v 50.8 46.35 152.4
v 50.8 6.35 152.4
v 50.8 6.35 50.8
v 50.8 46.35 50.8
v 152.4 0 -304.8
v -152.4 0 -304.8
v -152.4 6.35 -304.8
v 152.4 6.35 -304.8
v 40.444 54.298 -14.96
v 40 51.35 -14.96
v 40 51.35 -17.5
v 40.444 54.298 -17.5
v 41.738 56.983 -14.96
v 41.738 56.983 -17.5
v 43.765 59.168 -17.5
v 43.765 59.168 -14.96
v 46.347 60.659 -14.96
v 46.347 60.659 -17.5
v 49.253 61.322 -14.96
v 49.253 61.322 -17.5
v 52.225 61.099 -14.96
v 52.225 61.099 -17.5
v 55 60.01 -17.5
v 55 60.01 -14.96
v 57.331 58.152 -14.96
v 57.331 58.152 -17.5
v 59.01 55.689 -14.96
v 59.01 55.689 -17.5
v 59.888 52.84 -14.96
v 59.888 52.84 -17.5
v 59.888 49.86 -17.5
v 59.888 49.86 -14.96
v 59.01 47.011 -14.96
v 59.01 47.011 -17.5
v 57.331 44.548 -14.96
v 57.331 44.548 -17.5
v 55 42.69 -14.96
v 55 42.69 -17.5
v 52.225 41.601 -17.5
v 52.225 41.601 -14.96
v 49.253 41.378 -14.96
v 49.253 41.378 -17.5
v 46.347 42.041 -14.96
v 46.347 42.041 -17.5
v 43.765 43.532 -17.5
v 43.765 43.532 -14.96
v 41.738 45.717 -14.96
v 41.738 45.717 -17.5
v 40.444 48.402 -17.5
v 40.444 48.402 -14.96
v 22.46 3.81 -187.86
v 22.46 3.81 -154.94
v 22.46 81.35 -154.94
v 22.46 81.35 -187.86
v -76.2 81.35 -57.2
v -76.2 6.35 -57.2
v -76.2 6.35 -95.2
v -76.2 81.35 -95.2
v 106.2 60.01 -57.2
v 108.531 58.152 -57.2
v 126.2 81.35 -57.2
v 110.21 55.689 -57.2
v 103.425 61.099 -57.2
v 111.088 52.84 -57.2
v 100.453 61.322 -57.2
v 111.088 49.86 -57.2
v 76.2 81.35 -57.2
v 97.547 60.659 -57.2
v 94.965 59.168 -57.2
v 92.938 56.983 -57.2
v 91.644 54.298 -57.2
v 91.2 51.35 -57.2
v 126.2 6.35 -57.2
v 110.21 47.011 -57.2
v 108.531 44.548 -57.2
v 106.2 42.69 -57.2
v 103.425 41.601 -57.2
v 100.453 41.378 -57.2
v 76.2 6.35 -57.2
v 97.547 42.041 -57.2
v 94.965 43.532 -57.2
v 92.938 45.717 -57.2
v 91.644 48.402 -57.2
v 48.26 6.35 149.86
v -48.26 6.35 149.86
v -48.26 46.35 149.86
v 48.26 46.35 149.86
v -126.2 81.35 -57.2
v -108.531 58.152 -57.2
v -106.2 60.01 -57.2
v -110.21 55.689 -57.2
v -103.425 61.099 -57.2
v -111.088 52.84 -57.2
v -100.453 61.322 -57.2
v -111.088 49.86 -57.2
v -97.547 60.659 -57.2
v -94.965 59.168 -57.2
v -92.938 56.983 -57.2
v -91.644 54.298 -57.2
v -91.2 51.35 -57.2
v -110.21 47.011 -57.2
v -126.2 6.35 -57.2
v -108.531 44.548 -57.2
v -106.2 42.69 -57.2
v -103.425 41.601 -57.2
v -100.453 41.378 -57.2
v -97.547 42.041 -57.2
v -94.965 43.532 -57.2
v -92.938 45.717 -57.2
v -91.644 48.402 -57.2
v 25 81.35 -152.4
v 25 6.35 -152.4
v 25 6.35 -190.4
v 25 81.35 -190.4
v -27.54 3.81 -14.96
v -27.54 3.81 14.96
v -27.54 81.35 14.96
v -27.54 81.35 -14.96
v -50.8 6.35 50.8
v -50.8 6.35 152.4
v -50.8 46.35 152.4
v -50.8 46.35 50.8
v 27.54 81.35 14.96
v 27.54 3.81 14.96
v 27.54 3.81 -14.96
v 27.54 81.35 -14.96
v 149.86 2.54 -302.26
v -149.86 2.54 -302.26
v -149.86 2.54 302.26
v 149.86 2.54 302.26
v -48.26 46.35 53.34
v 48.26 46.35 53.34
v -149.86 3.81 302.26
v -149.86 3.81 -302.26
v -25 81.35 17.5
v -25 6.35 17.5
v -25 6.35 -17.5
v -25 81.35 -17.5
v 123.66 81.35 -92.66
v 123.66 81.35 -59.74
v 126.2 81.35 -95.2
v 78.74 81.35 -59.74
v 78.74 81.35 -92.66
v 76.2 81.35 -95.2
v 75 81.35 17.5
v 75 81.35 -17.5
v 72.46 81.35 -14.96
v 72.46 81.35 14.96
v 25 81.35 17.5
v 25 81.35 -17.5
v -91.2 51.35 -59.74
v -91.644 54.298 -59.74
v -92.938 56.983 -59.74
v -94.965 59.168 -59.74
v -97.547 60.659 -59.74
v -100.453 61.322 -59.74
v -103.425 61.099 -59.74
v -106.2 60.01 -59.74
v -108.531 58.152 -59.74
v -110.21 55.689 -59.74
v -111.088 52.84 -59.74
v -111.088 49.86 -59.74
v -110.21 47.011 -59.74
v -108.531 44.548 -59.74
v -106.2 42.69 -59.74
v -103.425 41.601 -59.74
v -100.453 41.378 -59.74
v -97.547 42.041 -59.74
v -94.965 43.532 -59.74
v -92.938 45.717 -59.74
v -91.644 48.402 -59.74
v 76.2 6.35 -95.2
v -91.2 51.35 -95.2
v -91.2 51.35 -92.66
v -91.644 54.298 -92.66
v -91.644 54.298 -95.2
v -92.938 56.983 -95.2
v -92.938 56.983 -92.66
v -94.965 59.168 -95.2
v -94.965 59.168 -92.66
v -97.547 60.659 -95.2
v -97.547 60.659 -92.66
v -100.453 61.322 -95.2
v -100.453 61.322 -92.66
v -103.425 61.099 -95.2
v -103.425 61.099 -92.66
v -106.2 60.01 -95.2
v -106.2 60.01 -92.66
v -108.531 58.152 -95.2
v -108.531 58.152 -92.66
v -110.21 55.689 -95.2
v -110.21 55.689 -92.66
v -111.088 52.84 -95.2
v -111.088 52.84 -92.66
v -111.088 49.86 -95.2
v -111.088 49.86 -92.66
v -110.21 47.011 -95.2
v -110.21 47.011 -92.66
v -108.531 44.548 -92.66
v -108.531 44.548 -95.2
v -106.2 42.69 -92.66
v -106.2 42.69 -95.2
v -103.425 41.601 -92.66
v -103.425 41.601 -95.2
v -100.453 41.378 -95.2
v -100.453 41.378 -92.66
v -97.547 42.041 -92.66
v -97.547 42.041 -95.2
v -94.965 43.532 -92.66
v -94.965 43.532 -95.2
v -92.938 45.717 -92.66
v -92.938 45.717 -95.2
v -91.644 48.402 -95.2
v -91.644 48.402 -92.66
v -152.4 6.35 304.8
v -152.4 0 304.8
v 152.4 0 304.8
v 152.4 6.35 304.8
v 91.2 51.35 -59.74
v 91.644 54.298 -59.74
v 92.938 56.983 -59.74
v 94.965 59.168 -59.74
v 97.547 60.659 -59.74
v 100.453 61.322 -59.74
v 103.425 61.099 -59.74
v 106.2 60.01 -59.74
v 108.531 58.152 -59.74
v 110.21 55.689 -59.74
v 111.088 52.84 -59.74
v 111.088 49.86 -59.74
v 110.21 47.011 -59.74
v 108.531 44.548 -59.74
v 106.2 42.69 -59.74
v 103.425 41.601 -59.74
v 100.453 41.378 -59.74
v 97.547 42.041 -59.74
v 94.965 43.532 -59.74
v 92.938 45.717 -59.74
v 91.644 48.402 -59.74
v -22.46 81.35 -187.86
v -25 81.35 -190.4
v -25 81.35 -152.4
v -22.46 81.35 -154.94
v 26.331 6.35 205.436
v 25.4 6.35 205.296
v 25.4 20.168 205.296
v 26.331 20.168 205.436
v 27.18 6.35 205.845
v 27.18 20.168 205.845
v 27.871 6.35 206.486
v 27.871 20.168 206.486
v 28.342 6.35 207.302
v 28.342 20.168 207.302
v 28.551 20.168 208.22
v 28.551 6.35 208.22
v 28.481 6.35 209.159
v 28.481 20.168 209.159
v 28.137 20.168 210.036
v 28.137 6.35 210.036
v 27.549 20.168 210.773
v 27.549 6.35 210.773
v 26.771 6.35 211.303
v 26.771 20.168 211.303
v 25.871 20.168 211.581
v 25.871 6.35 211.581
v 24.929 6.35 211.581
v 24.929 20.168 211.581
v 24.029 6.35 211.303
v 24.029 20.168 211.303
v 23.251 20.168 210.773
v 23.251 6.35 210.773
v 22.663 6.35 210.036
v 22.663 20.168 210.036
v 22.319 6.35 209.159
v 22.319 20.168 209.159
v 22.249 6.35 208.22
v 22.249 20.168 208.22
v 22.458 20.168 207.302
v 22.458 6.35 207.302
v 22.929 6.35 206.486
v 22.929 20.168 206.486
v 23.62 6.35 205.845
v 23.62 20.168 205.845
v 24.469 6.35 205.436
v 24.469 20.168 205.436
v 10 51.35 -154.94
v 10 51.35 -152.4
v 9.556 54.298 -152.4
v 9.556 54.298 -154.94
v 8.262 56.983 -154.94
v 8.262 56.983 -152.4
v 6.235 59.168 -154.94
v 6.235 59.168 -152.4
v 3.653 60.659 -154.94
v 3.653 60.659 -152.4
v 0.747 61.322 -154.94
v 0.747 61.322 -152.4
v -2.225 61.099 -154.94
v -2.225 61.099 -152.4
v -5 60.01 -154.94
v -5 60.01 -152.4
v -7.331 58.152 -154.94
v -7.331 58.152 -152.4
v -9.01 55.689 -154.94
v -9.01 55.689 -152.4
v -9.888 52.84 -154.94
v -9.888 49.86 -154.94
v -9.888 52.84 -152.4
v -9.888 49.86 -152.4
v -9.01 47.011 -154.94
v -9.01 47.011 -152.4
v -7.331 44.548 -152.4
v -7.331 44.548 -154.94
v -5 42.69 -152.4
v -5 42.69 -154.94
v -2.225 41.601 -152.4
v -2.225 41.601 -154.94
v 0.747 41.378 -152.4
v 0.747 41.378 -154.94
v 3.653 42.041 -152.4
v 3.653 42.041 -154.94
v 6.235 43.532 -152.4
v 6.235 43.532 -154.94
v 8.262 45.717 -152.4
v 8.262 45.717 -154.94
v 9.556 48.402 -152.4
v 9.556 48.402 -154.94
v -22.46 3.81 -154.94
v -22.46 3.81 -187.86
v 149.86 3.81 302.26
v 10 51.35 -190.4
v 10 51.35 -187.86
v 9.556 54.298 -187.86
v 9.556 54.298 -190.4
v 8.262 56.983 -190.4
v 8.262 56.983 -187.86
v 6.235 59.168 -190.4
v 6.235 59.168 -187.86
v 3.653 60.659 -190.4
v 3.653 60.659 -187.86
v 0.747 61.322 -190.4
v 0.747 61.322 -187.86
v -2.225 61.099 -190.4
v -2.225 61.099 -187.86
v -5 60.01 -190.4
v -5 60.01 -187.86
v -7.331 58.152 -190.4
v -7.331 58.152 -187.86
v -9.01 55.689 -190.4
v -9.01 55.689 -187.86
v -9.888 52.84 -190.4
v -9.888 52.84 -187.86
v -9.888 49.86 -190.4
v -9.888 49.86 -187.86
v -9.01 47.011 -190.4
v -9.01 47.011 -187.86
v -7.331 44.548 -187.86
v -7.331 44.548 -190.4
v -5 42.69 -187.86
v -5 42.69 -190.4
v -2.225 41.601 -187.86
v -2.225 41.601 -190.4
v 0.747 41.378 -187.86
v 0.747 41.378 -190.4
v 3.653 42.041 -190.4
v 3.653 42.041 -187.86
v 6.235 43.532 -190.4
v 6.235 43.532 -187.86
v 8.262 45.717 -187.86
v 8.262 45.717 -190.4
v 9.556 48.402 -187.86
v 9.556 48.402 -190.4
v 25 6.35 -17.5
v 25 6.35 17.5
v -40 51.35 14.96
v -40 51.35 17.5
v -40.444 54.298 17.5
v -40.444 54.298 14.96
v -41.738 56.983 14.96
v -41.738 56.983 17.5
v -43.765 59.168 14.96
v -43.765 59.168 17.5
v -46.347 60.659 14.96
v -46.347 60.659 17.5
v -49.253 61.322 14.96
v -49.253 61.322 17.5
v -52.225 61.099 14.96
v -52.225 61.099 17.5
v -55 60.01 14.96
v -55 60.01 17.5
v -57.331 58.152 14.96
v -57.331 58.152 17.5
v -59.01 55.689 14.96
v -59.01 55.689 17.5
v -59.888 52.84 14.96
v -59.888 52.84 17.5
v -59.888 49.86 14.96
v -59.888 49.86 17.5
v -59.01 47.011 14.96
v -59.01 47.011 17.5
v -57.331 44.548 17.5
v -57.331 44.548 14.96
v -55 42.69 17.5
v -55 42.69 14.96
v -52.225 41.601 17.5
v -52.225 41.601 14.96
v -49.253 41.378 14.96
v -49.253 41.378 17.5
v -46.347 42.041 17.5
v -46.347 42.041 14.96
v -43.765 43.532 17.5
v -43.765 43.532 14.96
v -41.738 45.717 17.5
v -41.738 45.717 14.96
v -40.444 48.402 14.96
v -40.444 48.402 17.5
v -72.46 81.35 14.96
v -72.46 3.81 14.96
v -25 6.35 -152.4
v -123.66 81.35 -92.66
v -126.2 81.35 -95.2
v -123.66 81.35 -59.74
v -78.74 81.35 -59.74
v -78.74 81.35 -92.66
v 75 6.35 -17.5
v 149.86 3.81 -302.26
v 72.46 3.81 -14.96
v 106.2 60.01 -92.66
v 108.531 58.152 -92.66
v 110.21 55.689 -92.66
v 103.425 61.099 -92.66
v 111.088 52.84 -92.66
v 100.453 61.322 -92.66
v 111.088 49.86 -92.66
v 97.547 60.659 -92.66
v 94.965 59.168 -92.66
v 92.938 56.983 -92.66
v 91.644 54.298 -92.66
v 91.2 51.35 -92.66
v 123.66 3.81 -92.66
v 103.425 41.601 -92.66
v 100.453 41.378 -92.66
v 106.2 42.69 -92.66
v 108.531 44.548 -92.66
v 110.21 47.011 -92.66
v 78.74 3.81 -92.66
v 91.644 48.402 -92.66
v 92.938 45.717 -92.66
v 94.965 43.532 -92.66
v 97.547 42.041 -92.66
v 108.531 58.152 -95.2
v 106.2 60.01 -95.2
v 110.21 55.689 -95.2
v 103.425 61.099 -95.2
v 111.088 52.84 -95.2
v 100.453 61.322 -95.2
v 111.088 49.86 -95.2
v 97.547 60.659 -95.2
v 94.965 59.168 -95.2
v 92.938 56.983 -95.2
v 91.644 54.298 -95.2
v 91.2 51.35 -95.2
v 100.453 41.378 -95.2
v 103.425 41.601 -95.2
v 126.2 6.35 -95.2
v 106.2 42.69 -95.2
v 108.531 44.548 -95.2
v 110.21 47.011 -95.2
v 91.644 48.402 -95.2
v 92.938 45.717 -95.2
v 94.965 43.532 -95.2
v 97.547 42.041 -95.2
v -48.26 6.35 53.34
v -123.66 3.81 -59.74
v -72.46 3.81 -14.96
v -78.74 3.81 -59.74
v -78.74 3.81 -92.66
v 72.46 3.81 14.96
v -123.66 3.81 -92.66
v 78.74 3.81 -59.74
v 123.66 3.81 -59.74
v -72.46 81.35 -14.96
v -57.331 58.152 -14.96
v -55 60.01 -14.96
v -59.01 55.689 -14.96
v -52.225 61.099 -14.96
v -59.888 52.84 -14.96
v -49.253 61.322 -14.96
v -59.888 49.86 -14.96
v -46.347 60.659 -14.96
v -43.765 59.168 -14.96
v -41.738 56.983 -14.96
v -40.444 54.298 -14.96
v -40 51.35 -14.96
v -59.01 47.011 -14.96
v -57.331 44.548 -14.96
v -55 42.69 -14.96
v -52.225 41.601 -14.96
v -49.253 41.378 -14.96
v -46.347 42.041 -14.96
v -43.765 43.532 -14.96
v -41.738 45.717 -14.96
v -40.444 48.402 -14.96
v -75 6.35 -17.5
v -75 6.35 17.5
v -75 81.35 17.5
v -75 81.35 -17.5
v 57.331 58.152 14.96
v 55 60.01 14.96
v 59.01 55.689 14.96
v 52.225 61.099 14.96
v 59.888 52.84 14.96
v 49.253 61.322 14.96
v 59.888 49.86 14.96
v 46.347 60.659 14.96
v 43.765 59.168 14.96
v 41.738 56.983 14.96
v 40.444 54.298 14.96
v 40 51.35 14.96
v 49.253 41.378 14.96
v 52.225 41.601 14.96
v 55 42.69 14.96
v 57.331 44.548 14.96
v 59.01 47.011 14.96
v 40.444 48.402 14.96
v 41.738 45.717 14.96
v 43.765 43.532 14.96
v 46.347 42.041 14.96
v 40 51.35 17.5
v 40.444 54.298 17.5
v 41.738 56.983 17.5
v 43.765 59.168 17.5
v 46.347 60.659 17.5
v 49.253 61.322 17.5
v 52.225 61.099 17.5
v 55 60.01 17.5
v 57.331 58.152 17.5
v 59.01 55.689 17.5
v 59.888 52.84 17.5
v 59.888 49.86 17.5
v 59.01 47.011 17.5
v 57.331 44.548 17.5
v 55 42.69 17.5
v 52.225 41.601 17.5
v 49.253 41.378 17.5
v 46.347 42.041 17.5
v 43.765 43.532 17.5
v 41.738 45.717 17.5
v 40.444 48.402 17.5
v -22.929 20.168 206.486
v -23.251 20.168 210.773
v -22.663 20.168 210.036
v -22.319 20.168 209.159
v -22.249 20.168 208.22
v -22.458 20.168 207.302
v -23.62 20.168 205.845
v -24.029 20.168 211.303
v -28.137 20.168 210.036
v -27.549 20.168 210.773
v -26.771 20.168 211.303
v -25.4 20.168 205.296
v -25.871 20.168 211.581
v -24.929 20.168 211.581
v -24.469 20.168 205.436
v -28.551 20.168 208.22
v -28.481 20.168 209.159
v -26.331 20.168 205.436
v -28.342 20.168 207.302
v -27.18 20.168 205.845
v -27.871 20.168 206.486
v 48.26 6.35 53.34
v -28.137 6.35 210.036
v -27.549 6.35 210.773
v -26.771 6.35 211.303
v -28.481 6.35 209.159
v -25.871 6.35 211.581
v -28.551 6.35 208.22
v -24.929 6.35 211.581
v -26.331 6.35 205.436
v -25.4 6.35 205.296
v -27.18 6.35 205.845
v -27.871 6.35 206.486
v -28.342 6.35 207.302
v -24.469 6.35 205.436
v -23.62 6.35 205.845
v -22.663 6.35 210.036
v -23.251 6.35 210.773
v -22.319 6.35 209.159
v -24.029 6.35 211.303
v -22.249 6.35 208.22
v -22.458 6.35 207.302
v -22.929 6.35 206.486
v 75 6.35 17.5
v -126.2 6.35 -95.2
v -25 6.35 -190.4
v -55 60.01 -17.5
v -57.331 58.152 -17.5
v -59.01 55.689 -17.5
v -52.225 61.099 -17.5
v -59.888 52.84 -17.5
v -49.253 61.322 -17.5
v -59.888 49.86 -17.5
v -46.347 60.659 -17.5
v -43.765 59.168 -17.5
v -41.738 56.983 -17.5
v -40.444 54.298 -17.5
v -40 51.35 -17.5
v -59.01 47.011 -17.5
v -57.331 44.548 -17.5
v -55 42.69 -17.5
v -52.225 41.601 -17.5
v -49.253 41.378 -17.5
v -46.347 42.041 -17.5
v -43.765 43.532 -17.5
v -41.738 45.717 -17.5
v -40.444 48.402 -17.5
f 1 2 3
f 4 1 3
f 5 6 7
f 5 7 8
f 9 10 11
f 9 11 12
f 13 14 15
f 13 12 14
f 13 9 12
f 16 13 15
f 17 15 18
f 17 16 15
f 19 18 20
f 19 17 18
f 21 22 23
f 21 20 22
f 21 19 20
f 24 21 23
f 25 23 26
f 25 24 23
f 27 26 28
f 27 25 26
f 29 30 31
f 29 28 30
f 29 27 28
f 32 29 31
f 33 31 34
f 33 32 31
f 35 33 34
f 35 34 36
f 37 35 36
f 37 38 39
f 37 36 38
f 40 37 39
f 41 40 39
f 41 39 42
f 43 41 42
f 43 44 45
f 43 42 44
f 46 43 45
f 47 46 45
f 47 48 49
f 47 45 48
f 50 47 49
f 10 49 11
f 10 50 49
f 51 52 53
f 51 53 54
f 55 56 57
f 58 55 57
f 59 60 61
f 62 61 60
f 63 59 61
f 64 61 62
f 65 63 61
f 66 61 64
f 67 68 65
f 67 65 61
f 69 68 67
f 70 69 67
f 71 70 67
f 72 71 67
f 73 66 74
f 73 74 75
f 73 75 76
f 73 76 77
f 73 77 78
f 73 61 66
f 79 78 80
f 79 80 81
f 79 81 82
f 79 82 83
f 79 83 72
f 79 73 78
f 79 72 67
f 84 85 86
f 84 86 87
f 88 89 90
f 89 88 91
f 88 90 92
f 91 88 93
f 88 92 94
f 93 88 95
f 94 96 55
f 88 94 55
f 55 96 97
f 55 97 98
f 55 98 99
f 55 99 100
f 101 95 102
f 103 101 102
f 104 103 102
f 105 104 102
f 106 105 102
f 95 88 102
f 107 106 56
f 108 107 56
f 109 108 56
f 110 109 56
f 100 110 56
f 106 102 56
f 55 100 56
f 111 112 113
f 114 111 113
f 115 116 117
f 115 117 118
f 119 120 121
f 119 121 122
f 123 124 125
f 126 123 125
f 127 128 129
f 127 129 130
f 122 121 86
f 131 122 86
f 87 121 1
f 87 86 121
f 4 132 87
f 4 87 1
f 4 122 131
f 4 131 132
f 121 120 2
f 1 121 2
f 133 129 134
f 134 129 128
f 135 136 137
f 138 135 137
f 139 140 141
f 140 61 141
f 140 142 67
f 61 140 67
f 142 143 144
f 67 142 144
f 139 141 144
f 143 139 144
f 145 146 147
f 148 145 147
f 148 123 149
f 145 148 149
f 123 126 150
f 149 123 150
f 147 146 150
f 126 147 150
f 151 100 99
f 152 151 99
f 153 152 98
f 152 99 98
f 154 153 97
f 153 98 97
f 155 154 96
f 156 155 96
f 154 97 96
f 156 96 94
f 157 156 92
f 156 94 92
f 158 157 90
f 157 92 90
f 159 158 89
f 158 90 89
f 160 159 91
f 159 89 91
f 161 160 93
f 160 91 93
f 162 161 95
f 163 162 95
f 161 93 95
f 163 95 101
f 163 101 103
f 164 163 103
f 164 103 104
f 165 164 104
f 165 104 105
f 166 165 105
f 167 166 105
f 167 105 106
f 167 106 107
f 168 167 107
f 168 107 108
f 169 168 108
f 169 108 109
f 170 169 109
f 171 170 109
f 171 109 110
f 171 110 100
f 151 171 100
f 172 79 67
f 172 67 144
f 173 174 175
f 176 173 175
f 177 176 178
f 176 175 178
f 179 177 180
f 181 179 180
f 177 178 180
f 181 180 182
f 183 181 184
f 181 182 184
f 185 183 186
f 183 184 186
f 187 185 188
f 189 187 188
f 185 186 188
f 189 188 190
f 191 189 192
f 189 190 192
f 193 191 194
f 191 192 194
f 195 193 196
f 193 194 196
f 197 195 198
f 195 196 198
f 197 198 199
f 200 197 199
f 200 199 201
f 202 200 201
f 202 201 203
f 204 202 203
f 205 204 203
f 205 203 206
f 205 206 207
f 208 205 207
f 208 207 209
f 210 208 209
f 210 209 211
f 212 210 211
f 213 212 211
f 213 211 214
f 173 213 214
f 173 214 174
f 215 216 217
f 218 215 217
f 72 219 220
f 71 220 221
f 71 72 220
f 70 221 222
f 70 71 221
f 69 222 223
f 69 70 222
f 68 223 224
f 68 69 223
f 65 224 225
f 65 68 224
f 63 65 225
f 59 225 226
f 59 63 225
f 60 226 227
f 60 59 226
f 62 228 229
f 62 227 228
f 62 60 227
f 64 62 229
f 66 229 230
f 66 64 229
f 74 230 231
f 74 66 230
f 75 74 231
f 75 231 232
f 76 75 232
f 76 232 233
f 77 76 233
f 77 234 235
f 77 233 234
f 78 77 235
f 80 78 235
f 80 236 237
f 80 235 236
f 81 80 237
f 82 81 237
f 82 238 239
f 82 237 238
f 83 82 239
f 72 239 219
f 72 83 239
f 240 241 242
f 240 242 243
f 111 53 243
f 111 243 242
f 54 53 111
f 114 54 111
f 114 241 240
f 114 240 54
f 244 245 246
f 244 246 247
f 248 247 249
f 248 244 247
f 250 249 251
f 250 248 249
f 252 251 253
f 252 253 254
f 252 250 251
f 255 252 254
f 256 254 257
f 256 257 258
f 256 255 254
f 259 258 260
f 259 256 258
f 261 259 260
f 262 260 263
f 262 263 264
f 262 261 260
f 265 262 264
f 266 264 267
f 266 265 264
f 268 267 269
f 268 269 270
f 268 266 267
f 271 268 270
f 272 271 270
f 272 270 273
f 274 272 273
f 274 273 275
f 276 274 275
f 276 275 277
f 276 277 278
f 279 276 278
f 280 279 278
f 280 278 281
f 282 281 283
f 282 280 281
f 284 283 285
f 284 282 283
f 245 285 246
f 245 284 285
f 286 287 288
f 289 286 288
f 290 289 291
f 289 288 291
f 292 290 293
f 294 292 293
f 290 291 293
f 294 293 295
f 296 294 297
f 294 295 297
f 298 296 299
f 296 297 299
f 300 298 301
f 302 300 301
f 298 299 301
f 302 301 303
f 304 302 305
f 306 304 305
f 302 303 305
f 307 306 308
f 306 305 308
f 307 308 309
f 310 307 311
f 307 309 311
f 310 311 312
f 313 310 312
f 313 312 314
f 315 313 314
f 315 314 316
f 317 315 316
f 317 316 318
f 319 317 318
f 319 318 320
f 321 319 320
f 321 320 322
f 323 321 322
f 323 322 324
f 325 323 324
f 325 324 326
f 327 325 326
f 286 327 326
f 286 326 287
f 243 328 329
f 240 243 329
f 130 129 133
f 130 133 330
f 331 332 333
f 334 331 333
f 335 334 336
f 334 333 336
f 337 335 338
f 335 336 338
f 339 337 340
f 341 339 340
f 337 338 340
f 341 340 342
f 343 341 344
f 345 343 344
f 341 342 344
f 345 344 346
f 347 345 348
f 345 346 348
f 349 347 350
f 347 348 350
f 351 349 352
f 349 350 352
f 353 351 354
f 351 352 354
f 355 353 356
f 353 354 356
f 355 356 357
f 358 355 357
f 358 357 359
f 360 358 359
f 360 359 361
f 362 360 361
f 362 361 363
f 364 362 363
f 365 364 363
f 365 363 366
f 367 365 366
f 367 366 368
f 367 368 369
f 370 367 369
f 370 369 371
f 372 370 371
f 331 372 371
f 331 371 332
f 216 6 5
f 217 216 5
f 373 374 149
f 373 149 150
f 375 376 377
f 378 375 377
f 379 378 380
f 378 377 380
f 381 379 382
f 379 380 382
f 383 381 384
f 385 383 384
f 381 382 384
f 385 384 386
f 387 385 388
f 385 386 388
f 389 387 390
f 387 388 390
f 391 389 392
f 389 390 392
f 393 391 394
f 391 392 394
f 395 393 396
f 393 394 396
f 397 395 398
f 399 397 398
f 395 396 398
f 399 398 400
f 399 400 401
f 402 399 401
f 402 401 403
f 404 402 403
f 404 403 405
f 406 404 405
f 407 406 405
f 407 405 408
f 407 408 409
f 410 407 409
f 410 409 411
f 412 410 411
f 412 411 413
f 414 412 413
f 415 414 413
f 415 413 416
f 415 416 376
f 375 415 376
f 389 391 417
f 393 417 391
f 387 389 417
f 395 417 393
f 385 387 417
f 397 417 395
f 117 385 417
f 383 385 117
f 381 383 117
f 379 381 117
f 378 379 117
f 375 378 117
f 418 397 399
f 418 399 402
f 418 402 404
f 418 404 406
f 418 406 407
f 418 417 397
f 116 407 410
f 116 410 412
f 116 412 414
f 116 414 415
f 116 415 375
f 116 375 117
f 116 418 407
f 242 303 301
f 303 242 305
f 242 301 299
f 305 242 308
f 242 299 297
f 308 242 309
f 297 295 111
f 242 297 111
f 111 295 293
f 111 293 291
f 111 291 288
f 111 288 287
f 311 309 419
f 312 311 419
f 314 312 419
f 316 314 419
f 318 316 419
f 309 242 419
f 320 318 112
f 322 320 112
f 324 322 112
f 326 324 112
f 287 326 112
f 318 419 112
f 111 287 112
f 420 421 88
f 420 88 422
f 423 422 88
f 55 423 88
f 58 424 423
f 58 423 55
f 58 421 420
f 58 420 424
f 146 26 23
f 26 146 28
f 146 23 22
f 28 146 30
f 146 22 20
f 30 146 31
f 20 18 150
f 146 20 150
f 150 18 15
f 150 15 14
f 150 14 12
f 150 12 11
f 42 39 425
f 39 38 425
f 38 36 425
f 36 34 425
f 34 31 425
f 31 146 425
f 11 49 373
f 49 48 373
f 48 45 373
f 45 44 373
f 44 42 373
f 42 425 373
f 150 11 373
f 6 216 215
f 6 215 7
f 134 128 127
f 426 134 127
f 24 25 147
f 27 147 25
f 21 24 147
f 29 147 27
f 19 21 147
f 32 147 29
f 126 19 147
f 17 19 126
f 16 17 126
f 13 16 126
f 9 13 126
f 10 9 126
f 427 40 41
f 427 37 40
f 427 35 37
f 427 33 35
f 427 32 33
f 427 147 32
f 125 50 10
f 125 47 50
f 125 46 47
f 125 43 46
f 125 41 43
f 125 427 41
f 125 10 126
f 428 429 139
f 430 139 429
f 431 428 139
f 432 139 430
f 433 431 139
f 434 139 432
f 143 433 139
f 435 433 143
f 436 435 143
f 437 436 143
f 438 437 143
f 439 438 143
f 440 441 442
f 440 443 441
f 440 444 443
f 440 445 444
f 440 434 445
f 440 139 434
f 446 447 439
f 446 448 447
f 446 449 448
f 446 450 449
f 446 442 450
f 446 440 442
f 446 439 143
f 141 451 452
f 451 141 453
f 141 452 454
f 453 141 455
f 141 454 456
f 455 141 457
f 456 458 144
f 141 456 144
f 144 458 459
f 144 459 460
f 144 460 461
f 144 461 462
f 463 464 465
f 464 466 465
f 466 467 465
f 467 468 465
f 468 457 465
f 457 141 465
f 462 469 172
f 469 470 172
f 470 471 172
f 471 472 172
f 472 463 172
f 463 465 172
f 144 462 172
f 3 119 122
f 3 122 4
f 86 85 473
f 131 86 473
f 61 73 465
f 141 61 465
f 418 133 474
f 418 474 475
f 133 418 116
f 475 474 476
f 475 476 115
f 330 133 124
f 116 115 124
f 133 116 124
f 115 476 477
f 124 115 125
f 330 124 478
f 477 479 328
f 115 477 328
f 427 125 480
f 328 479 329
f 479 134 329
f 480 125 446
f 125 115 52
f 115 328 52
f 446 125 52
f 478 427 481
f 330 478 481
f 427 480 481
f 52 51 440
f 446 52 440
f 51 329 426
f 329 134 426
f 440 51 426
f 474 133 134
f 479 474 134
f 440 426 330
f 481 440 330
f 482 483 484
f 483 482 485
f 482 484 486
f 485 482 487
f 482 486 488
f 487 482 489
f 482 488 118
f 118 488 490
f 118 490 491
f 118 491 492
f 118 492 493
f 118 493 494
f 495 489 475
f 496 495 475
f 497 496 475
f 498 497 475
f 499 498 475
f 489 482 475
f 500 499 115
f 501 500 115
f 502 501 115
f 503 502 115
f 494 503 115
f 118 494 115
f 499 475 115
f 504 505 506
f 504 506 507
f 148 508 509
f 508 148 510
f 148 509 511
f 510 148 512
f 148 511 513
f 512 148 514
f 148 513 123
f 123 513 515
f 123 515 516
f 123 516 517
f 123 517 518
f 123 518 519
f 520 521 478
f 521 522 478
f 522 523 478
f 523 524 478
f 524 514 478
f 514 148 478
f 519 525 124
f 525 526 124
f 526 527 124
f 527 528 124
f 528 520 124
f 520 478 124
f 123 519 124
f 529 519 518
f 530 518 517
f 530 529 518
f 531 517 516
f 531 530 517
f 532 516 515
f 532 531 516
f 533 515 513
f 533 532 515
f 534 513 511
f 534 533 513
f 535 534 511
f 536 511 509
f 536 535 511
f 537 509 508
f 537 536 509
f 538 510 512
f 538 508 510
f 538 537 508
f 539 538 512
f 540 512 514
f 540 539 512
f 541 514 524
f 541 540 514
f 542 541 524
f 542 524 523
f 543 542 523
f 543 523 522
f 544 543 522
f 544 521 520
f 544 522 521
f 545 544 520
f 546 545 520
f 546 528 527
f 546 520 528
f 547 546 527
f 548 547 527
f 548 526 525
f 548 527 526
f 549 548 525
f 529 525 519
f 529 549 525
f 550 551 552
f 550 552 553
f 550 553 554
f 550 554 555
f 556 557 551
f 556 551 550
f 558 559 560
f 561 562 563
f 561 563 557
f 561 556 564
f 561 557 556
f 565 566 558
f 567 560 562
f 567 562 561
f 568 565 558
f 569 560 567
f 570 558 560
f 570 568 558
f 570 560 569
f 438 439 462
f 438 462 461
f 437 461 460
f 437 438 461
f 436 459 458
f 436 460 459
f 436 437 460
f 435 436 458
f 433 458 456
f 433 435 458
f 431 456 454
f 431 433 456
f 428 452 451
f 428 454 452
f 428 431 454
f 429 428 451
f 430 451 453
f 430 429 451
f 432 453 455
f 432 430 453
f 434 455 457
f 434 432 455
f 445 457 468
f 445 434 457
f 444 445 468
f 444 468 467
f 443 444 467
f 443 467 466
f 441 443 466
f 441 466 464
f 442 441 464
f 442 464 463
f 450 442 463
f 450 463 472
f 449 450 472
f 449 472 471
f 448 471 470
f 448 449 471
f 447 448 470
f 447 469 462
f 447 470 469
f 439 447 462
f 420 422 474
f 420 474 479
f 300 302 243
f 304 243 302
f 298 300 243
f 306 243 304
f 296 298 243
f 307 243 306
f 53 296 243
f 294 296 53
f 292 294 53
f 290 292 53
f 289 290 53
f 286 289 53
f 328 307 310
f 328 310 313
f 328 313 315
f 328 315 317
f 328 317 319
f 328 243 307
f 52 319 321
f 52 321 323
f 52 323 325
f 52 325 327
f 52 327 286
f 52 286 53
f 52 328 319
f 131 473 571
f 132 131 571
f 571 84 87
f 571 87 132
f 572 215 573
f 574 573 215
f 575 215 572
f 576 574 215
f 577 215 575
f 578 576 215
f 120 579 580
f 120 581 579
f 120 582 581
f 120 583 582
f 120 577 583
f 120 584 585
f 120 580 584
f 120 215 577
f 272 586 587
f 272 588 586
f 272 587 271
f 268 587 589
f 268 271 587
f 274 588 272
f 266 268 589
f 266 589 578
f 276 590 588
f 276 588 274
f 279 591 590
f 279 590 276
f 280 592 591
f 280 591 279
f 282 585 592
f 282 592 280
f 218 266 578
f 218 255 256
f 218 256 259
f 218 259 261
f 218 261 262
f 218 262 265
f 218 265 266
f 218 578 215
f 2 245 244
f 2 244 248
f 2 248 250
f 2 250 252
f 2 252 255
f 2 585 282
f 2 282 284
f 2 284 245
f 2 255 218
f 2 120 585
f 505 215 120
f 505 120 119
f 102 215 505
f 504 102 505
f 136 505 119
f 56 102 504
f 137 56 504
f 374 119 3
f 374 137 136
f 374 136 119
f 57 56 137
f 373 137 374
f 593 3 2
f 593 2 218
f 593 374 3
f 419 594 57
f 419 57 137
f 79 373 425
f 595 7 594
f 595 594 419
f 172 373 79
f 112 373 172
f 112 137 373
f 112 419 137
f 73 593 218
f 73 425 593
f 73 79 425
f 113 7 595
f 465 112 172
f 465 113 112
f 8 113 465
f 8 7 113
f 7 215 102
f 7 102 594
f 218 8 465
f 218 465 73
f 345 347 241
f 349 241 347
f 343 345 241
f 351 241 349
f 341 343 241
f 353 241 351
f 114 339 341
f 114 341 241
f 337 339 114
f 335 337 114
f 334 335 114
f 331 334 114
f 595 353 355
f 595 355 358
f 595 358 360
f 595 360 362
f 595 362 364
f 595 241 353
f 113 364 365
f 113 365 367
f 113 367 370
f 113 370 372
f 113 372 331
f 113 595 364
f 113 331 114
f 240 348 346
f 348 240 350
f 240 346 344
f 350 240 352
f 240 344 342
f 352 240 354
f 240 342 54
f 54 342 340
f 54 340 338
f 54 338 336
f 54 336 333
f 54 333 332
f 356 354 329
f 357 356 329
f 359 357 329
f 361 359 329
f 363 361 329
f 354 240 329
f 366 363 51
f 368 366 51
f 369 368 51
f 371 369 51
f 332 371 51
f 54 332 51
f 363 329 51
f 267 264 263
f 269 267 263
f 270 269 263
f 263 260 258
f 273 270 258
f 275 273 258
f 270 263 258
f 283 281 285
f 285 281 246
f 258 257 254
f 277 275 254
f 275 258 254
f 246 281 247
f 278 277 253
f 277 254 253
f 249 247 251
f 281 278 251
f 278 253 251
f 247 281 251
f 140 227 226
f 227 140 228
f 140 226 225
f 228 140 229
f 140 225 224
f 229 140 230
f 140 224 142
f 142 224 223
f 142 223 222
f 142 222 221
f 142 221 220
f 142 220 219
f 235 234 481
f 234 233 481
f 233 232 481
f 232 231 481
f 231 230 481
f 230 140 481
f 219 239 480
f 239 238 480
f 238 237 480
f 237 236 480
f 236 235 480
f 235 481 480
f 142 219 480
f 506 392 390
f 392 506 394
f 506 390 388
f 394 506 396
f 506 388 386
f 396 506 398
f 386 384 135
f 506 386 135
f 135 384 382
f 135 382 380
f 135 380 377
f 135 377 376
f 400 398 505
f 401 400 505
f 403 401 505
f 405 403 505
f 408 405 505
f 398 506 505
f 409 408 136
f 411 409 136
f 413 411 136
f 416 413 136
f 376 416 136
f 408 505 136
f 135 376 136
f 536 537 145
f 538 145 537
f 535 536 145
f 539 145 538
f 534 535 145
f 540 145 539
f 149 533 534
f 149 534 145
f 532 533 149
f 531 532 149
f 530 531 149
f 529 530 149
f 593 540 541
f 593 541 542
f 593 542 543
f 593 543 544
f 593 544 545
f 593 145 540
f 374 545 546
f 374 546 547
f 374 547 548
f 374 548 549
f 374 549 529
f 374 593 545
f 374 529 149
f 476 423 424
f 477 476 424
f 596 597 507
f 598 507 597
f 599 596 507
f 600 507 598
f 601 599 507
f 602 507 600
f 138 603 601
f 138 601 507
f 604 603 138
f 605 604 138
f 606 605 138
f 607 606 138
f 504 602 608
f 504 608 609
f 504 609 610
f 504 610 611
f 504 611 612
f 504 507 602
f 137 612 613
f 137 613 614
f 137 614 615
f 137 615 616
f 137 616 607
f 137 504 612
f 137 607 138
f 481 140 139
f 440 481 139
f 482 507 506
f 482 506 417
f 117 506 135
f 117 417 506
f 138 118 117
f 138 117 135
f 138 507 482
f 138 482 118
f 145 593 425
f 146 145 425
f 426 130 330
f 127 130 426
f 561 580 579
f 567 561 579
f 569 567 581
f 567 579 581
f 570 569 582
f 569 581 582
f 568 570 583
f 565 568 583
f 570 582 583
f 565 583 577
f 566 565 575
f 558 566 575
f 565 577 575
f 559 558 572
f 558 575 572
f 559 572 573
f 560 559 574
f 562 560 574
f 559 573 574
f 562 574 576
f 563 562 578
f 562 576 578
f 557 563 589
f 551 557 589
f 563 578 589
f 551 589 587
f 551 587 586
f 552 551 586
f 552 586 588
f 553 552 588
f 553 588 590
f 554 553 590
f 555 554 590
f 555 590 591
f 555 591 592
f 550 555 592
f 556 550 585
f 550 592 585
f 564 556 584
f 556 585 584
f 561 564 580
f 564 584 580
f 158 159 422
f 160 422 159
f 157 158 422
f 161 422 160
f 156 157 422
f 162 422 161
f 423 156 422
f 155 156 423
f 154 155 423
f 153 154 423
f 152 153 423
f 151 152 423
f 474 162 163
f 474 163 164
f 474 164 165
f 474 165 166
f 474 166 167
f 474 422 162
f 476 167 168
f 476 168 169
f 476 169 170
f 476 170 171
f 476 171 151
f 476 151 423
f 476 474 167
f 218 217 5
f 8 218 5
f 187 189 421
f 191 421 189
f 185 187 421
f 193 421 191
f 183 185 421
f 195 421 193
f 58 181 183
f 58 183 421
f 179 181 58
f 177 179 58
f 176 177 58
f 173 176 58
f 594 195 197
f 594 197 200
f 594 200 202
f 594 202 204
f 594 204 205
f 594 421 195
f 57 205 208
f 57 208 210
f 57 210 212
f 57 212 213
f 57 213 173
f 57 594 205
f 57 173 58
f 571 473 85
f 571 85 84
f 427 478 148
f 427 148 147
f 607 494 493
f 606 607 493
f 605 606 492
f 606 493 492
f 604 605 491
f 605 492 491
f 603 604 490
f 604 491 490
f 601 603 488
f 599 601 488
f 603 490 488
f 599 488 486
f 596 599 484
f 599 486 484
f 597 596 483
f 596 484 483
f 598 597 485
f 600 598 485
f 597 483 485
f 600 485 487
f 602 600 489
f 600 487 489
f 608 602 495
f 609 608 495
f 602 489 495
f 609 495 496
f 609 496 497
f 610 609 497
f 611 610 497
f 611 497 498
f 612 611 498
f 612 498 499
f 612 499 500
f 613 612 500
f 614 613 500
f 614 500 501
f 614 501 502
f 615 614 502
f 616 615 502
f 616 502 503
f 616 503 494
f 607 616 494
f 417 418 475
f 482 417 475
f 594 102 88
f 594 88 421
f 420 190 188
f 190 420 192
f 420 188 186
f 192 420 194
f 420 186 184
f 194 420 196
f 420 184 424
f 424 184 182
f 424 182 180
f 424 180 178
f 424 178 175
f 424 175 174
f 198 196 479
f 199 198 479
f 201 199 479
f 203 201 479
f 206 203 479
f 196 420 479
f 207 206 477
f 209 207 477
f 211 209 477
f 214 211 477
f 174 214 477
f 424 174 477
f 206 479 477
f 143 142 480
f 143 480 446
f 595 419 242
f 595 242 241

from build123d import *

# Parameters (mm, degrees)
SKETCH1_W           = 304.8
SKETCH1_H           = 609.6
BOSS_EXTRUDE1_DEPTH = 6.35
SKETCH2_W           = 50
SKETCH2_H           = 38
BOSS_EXTRUDE2_DEPTH = 75
SKETCH4_W           = 50.000000076
SKETCH4_H           = 37.999999946
BOSS_EXTRUDE3_DEPTH = 75
SKETCH5_W           = 50
SKETCH5_H           = 35
BOSS_EXTRUDE4_DEPTH = 75
SHELL11_T           = -2.54
SKETCH3_R           = 10
CUT_EXTRUDE2_DEPTH  = 75
SKETCH6_R           = 10
CUT_EXTRUDE3_DEPTH  = 75
SKETCH7_R           = 10
CUT_EXTRUDE4_DEPTH  = 75
SKETCH8_W           = 101.6
SKETCH8_H           = 101.6
BOSS_EXTRUDE5_DEPTH = 40
SHELL12_START       = 6.35
SHELL12_OUTLINE_W   = 96.52
SHELL12_OUTLINE_H   = 96.52
SHELL12_DEPTH       = 40
SKETCH9_R           = 3.16
BOSS_EXTRUDE6_DEPTH = 13.8176


# Read off the part's stored shape, not the designer's step: Shell12
with BuildPart() as part:
    # Sketch1 → Boss-Extrude1 (new body)
    with BuildSketch(Plane(origin=(0, 0, 0), x_dir=(1, 0, 0), z_dir=(0, 1, 0))):
        Rectangle(SKETCH1_W, SKETCH1_H)
    extrude(amount=BOSS_EXTRUDE1_DEPTH)

    # Sketch2 → Boss-Extrude2 (add)
    with BuildSketch(Plane(origin=(0, 6.35, 0), x_dir=(1, 0, 0), z_dir=(0, 1, 0))):
        with Locations((0, 171.4)):
            Rectangle(SKETCH2_W, SKETCH2_H)
    extrude(amount=BOSS_EXTRUDE2_DEPTH)

    # Sketch4 → Boss-Extrude3 (add)
    with BuildSketch(Plane(origin=(0, 6.35, 0), x_dir=(1, 0, 0), z_dir=(0, 1, 0))):
        with Locations((-101.200000038, 76.2)):
            Rectangle(SKETCH4_W, SKETCH4_H)
    boss_extrude3 = extrude(amount=BOSS_EXTRUDE3_DEPTH)

    # Sketch5 → Boss-Extrude4 (add)
    with BuildSketch(Plane(origin=(0, 6.35, 0), x_dir=(1, 0, 0), z_dir=(0, 1, 0))):
        with Locations((-50, 0)):
            Rectangle(SKETCH5_W, SKETCH5_H)
    boss_extrude4 = extrude(amount=BOSS_EXTRUDE4_DEPTH)

    # Mirror1: Boss-Extrude3, Boss-Extrude4 across plane
    add(boss_extrude3.mirror(Plane(origin=(0, 0, 0), x_dir=(0, 0, 1), z_dir=(1, 0, 0))))
    add(boss_extrude4.mirror(Plane(origin=(0, 0, 0), x_dir=(0, 0, 1), z_dir=(1, 0, 0))))

    # Shell11
    shell11_openings = [part.faces().sort_by_distance(p)[0] for p in [
        (0, 81.35, -171.4),
        (-101.200000038, 81.35, -76.2),
        (-50, 81.35, 0),
        (101.200000038, 81.35, -76.2),
        (50, 81.35, 0),
    ]]
    offset(amount=SHELL11_T, openings=shell11_openings, kind=Kind.INTERSECTION)

    # Sketch3 → Cut-Extrude2 (cut)
    with BuildSketch(Plane.XY.offset(-152.4)):
        with Locations((0, 51.35)):
            Circle(SKETCH3_R)
    extrude(amount=-CUT_EXTRUDE2_DEPTH, mode=Mode.SUBTRACT)

    # Sketch6 → Cut-Extrude3 (cut)
    with BuildSketch(Plane.XY.offset(-57.200000027)):
        with Locations((-101.2, 51.35)):
            Circle(SKETCH6_R)
    cut_extrude3 = extrude(amount=-CUT_EXTRUDE3_DEPTH, mode=Mode.SUBTRACT)

    # Sketch7 → Cut-Extrude4 (cut)
    with BuildSketch(Plane.XY.offset(17.5)):
        with Locations((-50, 51.35)):
            Circle(SKETCH7_R)
    cut_extrude4 = extrude(amount=-CUT_EXTRUDE4_DEPTH, mode=Mode.SUBTRACT)

    # Mirror2: Cut-Extrude3, Cut-Extrude4 across plane
    add(cut_extrude3.mirror(Plane(origin=(0, 0, 0), x_dir=(0, 0, 1), z_dir=(1, 0, 0))), mode=Mode.SUBTRACT)
    add(cut_extrude4.mirror(Plane(origin=(0, 0, 0), x_dir=(0, 0, 1), z_dir=(1, 0, 0))), mode=Mode.SUBTRACT)

    # Sketch8 → Boss-Extrude5 (add)
    with BuildSketch(Plane(origin=(0, 6.35, 0), x_dir=(1, 0, 0), z_dir=(0, 1, 0))):
        with Locations((0, -101.6)):
            Rectangle(SKETCH8_W, SKETCH8_H)
    extrude(amount=BOSS_EXTRUDE5_DEPTH)

    # Shell12 outline → Shell12 (cut)
    with BuildSketch(Plane(origin=(0, 0, 0), x_dir=(1, 0, 0), z_dir=(0, 1, 0)).offset(SHELL12_START)):
        with Locations((0, -101.6)):
            Rectangle(SHELL12_OUTLINE_W, SHELL12_OUTLINE_H)
    extrude(amount=SHELL12_DEPTH, mode=Mode.SUBTRACT)

    # Sketch9 → Boss-Extrude6 (add)
    with BuildSketch(Plane(origin=(0, 6.35, 0), x_dir=(1, 0, 0), z_dir=(0, 1, 0))):
        with Locations(Location((-25.4, -208.456082319, 0), (0, 0, 90))):
            Circle(SKETCH9_R)
    boss_extrude6 = extrude(amount=BOSS_EXTRUDE6_DEPTH)

    # Mirror3: Boss-Extrude6 across plane
    add(boss_extrude6.mirror(Plane(origin=(0, 0, 0), x_dir=(0, 0, 1), z_dir=(1, 0, 0))))


solid = part.part
